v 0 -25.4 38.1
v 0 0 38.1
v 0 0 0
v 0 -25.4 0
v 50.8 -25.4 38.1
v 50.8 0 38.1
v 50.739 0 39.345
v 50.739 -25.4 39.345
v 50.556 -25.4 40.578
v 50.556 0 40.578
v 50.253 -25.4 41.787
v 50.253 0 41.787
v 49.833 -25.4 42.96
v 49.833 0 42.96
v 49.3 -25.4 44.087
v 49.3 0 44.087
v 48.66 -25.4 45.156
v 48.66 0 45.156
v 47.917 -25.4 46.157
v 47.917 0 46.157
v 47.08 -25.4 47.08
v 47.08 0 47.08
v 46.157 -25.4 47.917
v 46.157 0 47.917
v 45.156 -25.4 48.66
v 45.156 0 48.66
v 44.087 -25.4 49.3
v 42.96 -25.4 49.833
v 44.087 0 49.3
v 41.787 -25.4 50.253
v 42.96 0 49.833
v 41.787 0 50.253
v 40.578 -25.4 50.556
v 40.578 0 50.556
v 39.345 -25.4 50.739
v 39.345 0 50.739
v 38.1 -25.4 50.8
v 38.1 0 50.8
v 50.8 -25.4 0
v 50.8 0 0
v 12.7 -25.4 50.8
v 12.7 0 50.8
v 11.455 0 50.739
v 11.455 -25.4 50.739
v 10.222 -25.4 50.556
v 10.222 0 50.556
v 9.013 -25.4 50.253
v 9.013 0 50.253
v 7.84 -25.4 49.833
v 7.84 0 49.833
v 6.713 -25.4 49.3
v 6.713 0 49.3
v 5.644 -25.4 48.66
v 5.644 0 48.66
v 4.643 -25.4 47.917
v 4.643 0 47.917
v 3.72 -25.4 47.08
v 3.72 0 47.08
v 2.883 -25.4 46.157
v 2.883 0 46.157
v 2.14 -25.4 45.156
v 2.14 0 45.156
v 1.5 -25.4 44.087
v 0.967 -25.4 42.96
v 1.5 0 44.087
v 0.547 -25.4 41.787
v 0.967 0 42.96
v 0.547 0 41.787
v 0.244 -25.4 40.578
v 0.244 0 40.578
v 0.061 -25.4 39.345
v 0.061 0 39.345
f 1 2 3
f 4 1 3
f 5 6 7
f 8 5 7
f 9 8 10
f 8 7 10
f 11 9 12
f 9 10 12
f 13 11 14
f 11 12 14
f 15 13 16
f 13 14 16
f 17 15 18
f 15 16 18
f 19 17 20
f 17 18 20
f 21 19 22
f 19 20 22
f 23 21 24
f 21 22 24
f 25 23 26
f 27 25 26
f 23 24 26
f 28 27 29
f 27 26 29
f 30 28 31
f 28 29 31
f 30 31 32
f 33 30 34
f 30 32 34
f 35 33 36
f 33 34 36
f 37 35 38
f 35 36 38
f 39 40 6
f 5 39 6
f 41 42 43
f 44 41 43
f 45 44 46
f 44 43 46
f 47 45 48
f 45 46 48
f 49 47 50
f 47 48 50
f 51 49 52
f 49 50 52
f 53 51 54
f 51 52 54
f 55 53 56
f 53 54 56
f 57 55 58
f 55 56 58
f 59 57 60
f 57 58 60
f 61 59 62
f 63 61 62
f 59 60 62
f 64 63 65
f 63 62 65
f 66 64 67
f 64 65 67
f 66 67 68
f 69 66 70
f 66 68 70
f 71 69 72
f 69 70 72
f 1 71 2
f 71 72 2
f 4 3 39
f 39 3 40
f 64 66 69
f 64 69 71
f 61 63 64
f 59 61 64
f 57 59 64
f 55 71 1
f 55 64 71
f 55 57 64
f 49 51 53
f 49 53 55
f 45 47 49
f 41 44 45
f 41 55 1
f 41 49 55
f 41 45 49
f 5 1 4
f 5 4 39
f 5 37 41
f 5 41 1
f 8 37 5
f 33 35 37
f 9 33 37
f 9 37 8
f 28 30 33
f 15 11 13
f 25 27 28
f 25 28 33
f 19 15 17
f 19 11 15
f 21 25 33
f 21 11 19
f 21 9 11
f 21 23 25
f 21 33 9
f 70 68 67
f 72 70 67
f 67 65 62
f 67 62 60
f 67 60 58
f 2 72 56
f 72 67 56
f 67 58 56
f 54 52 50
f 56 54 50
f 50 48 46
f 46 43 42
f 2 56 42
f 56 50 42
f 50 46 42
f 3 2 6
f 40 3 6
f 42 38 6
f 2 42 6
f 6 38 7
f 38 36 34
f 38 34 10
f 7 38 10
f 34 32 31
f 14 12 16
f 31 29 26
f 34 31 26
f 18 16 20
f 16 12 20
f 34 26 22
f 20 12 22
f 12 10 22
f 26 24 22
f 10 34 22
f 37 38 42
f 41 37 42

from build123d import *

# Parameters (mm, degrees)
F1_DEPTH = 25.4
F3_DEPTH = 25.4


with BuildPart() as f1:
    # F0 (on Front) → F1 (new body)
    with BuildSketch(Plane.XZ):
        with BuildLine():
            Line((0, 38.1), (0, 0))
            Line((0, 0), (50.8, 0))
            Line((50.8, 0), (50.8, 38.1))
            ThreePointArc((50.8, 38.1), (47.080256, 47.080256), (38.1, 50.8))
            Line((38.1, 50.8), (12.7, 50.8))
            ThreePointArc((12.7, 50.8), (3.719744, 47.080256), (0, 38.1))
        make_face()
    extrude(amount=F1_DEPTH)

    # F2 (on Front) → F3 (join)
    with BuildSketch(Plane.XZ):
        Polygon((17.737616, 7.724446), (17.737616, 0), (39.861955, 0), (39.861955, 7.724446), (30.707058, 7.724446), (30.707058, 12.492622), (23.459429, 12.492622), (23.459429, 7.724446), align=None)
    extrude(amount=F3_DEPTH)


solid = f1.part
